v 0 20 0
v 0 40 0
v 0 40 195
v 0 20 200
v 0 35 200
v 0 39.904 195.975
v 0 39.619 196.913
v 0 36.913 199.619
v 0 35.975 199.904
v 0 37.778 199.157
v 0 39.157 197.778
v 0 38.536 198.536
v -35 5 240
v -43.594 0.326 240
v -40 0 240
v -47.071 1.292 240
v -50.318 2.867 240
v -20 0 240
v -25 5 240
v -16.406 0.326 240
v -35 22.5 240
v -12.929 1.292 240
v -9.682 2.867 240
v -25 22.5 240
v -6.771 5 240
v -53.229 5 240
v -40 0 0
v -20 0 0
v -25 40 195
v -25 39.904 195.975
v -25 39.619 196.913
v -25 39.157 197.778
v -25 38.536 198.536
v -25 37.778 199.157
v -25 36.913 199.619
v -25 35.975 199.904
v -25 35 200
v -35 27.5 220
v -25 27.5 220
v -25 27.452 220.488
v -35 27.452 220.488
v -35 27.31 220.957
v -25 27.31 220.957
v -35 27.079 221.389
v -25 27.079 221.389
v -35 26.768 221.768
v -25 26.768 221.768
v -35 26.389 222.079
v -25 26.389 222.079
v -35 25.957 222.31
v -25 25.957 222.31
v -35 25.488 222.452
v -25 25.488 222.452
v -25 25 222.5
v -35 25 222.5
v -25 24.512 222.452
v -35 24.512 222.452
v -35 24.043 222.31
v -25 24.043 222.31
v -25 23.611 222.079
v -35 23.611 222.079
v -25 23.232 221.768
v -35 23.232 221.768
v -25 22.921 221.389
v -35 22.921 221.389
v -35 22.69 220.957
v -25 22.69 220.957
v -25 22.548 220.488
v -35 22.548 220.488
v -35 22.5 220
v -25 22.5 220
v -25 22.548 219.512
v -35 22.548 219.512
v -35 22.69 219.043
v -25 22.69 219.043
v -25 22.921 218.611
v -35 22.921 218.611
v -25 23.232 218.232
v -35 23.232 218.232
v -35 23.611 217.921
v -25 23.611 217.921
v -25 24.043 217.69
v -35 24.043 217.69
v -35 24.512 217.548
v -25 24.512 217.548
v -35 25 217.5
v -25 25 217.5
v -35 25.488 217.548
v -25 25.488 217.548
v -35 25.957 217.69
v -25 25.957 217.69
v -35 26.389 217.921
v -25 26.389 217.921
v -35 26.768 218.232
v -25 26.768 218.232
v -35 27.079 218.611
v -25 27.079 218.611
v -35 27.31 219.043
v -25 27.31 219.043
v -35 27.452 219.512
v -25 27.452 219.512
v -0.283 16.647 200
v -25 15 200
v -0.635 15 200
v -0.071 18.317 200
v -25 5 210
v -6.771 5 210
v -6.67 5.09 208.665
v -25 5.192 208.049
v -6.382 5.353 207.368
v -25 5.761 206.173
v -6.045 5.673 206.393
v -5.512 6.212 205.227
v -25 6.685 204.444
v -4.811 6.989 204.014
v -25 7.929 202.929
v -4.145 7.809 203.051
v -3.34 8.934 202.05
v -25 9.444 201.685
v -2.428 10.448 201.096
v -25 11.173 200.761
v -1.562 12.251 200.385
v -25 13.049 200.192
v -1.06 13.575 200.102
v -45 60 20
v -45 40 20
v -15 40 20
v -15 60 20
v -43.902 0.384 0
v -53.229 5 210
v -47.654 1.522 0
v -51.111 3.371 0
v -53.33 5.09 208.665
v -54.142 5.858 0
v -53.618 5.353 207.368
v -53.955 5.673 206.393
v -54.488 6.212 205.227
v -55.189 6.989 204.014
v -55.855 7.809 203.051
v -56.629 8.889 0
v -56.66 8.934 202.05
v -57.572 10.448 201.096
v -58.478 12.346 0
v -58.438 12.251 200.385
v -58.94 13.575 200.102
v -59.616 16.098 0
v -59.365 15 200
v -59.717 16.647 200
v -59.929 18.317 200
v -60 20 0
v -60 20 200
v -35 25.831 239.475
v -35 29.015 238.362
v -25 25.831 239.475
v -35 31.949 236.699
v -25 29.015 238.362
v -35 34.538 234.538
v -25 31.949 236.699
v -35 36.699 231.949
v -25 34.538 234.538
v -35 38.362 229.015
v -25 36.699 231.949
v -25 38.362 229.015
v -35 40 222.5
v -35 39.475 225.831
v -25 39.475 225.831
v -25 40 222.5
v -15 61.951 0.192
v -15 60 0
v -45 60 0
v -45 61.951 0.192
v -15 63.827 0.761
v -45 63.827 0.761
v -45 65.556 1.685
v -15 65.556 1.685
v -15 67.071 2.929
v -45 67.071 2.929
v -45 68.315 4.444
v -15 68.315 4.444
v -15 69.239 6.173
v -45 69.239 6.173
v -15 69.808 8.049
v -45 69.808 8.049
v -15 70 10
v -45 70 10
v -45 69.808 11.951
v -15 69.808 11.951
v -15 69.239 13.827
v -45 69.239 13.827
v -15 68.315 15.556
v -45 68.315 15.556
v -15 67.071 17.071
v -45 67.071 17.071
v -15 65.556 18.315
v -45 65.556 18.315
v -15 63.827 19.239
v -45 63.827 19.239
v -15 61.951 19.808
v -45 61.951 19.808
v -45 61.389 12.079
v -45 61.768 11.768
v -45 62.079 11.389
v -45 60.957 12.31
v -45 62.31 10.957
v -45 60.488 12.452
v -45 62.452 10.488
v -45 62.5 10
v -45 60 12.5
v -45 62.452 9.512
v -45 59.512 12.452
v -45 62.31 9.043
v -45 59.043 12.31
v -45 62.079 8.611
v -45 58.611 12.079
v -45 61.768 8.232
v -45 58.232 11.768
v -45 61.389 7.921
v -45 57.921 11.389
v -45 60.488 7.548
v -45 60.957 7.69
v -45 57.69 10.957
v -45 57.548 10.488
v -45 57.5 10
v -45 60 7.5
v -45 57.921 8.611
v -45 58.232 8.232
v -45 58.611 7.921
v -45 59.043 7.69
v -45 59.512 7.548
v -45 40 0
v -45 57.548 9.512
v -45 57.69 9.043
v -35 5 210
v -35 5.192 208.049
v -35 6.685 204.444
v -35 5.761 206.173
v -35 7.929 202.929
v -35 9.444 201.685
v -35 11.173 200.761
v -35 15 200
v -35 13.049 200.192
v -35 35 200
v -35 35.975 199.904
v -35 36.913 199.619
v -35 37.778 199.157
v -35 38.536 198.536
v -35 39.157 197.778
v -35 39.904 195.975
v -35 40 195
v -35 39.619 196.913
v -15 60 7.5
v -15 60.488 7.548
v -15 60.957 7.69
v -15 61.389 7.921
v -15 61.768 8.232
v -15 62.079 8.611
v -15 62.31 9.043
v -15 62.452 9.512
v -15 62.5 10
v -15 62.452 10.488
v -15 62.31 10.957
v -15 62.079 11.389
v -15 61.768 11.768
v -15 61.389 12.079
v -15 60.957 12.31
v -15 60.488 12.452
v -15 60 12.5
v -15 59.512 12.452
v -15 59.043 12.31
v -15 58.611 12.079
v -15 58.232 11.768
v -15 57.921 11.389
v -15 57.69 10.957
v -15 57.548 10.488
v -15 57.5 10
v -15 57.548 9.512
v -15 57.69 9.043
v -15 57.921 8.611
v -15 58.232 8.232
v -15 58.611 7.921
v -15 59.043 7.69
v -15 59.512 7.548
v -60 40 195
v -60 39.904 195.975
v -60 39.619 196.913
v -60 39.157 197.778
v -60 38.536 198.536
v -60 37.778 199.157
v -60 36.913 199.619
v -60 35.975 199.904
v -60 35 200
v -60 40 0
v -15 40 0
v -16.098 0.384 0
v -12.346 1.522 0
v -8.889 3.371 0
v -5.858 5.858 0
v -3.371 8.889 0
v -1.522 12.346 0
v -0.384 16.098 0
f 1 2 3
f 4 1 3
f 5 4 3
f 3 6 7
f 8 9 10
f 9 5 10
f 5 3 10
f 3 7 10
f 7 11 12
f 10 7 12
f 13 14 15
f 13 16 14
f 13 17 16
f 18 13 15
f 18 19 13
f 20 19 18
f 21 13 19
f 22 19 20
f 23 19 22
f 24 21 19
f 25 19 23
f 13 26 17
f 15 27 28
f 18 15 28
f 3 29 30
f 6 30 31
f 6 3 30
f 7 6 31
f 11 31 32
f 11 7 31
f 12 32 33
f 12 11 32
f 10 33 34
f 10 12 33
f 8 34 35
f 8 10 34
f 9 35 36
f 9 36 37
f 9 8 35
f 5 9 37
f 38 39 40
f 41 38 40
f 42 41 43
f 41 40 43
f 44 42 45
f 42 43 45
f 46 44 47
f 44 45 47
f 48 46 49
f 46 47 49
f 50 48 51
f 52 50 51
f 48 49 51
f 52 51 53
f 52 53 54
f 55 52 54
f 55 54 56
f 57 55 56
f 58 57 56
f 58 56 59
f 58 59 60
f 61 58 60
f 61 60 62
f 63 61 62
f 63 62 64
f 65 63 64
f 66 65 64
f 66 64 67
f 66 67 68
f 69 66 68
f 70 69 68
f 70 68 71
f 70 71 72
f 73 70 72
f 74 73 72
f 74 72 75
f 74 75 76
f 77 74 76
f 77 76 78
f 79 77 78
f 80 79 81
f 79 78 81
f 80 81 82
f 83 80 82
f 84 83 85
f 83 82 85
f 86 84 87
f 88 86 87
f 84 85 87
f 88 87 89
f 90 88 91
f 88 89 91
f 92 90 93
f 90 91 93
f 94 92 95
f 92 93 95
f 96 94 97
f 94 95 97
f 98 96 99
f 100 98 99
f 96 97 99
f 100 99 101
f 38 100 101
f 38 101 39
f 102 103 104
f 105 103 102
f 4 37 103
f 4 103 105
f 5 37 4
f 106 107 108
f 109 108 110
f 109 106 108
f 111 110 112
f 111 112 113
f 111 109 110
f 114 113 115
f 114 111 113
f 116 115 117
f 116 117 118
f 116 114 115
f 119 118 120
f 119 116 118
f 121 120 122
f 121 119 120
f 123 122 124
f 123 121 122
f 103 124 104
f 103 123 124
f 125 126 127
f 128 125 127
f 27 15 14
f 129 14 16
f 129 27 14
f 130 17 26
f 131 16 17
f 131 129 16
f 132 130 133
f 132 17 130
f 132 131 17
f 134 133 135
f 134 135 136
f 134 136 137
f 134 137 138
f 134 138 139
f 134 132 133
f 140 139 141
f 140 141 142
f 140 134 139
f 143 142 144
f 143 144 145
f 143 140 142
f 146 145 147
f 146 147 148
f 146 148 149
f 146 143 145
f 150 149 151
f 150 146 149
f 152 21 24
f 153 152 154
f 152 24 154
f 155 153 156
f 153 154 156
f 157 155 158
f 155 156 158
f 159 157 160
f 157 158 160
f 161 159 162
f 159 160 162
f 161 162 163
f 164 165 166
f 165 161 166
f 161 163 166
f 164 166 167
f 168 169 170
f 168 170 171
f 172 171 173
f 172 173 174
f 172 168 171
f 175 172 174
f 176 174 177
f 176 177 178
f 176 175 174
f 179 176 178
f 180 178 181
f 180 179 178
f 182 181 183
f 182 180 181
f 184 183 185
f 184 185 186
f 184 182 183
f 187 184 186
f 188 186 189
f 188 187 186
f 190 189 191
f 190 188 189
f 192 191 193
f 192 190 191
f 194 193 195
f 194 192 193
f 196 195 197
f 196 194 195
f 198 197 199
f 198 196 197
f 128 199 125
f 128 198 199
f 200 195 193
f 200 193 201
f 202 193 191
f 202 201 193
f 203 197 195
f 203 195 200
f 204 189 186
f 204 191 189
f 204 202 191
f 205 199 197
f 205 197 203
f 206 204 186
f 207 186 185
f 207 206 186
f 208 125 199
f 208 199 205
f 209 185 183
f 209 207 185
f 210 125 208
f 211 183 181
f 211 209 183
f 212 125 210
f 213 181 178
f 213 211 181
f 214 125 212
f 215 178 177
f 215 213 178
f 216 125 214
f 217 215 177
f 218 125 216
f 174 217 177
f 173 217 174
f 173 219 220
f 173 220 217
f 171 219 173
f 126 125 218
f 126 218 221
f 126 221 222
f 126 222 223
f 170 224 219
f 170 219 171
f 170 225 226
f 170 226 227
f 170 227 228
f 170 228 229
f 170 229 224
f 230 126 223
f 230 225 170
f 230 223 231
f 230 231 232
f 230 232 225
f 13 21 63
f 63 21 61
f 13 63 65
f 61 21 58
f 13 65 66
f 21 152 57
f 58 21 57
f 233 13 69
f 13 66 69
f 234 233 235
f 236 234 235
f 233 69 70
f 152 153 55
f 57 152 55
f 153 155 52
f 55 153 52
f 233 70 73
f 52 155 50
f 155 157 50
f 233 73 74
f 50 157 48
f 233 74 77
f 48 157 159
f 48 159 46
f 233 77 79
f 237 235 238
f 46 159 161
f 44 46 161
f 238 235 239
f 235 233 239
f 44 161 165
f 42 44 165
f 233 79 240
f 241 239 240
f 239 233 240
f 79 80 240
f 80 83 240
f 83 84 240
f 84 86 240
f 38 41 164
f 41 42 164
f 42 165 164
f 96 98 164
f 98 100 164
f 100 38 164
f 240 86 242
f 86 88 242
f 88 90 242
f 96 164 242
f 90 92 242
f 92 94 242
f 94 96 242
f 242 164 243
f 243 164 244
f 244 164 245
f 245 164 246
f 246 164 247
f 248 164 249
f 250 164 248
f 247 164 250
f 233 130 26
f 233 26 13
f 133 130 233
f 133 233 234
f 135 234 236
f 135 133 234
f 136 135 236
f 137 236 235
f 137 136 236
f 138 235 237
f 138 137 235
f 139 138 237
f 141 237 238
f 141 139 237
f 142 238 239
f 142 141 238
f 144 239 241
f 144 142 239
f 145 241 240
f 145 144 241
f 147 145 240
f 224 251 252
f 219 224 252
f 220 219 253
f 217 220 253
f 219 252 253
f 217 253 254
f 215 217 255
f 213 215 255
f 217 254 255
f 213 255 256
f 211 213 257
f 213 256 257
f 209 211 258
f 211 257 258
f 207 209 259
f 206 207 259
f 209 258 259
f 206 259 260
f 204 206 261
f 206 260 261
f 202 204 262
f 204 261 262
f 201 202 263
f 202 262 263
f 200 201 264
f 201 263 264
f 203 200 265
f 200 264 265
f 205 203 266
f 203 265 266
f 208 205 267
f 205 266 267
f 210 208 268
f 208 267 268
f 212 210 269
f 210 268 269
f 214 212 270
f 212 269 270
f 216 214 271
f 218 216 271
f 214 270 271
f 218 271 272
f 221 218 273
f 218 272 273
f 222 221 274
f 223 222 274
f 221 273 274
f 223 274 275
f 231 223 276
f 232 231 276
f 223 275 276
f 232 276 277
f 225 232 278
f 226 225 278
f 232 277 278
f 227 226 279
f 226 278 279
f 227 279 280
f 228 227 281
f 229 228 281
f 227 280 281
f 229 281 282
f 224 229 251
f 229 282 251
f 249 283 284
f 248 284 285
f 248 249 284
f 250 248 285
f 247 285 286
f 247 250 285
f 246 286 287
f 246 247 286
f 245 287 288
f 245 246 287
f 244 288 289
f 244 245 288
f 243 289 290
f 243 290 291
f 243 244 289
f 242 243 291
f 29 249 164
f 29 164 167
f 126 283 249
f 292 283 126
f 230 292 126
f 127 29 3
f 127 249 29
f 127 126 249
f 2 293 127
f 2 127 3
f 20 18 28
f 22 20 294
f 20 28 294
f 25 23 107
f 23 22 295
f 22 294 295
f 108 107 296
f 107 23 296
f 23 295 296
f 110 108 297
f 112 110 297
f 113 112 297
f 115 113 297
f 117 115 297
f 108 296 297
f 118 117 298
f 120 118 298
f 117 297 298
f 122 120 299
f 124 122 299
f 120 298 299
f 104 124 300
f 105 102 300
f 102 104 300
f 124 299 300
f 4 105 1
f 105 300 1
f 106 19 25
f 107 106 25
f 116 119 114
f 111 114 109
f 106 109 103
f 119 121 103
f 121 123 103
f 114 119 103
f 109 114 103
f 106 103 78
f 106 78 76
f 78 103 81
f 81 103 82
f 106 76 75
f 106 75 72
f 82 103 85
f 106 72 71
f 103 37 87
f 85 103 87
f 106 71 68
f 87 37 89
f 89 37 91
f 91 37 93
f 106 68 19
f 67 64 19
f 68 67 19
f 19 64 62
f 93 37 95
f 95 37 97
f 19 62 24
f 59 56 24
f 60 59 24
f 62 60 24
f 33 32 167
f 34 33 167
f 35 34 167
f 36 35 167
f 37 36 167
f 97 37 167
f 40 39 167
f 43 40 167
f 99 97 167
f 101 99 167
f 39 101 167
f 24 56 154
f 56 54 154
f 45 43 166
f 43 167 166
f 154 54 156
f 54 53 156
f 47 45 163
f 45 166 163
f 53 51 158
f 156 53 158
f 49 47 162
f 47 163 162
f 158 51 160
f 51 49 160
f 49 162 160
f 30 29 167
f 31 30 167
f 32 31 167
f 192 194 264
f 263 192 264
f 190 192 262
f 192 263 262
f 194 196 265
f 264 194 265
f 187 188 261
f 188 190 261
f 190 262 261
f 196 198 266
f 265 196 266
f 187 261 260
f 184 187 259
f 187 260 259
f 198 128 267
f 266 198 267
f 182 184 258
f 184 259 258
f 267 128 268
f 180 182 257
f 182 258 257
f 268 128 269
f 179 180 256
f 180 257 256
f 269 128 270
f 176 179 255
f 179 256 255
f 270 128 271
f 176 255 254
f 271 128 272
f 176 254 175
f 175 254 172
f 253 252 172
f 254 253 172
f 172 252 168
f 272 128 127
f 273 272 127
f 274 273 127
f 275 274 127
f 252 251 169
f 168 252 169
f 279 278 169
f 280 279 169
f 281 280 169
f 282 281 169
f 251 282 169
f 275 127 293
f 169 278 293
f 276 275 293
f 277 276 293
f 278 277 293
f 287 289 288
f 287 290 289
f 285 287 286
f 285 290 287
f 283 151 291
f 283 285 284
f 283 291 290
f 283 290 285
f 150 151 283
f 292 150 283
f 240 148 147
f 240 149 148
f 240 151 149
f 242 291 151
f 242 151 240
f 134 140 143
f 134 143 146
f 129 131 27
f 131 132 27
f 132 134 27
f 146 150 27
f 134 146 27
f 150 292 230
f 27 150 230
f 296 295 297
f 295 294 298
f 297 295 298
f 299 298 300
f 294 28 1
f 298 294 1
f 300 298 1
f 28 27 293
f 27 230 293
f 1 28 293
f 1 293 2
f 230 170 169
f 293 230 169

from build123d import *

# Parameters (mm, degrees)
SKETCH1_W           = 60
SKETCH1_H           = 40
BOSS_EXTRUDE1_DEPTH = 240
SKETCH2_W           = 25
SKETCH2_H           = 40
CUT_EXTRUDE1_DEPTH  = 35
BOSS_EXTRUDE7_DEPTH = 25
BOSS_EXTRUDE5_START = 25
BOSS_EXTRUDE5_DEPTH = 25
SKETCH3_W           = 30
SKETCH3_H           = 20
BOSS_EXTRUDE2_DEPTH = 35
SKETCH5_R           = 2.5
CUT_EXTRUDE3_DEPTH  = 30
CUT_EXTRUDE4_DEPTH  = 240
CUT_EXTRUDE5_DEPTH  = 20
CUT_EXTRUDE6_DEPTH  = 25
CUT_EXTRUDE7_START  = -25
CUT_EXTRUDE7_DEPTH  = 25
SKETCH19_R          = 2.5
CUT_EXTRUDE8_DEPTH  = 30
CUT_EXTRUDE9_DEPTH  = 30


with BuildPart() as part:
    # Sketch1 → Boss-Extrude1 (new body)
    with BuildSketch(Plane.XY):
        with Locations((-30, 20)):
            Rectangle(SKETCH1_W, SKETCH1_H)
    extrude(amount=BOSS_EXTRUDE1_DEPTH)

    # Sketch2 → Cut-Extrude1 (cut)
    with BuildSketch(Plane(origin=(0, 40, 0), x_dir=(1, 0, 0), z_dir=(0, 1, 0))):
        with Locations((-47.5, -220)):
            Rectangle(SKETCH2_W, SKETCH2_H)
        with Locations((-12.5, -220)):
            Rectangle(SKETCH2_W, SKETCH2_H)
    extrude(amount=-CUT_EXTRUDE1_DEPTH, mode=Mode.SUBTRACT)

    # Sketch18 → Boss-Extrude7 (add)
    with BuildSketch(Plane(origin=(-25, 0, 0), x_dir=(0, 0, -1), z_dir=(1, 0, 0))):
        with BuildLine():
            Line((-200, 5), (-210, 5))
            ThreePointArc((-210, 5), (-202.928932188, 7.928932188), (-200, 15))
            Line((-200, 15), (-200, 5))
        make_face()
    extrude(amount=BOSS_EXTRUDE7_DEPTH)

    # Sketch16 → Boss-Extrude5 (add)
    with BuildSketch(Plane.ZY.offset(35).offset(BOSS_EXTRUDE5_START)):
        with BuildLine():
            Line((200, 15), (160, 5))
            Line((160, 5), (210, 5))
            ThreePointArc((210, 5), (202.928932188, 7.928932188), (200, 15))
        make_face()
    extrude(amount=-BOSS_EXTRUDE5_DEPTH)

    # Sketch3 → Boss-Extrude2 (add)
    with BuildSketch(Plane(origin=(0, 40, 0), x_dir=(1, 0, 0), z_dir=(0, 1, 0))):
        with Locations((-30, -10)):
            Rectangle(SKETCH3_W, SKETCH3_H)
    extrude(amount=BOSS_EXTRUDE2_DEPTH)

    # Sketch5 → Cut-Extrude3 (cut)
    with BuildSketch(Plane(origin=(-25, 0, 0), x_dir=(0, 0, -1), z_dir=(1, 0, 0))):
        with Locations((-220, 25)):
            Circle(SKETCH5_R)
    extrude(amount=-CUT_EXTRUDE3_DEPTH, mode=Mode.SUBTRACT)

    # Sketch6 → Cut-Extrude4 (cut)
    with BuildSketch(Plane(origin=(0, 0, 0), x_dir=(-1, 0, 0), z_dir=(0, 0, -1))):
        with BuildLine():
            Line((60, 20), (60, 0))
            Line((60, 0), (40, 0))
            ThreePointArc((40, 0), (54.142135624, 5.857864376), (60, 20))
        make_face()
        with BuildLine():
            Line((0, 20), (0, 0))
            Line((0, 0), (20, 0))
            ThreePointArc((20, 0), (5.857864376, 5.857864376), (0, 20))
        make_face()
    extrude(amount=-CUT_EXTRUDE4_DEPTH, mode=Mode.SUBTRACT)

    # Sketch8 → Cut-Extrude5 (cut)
    with BuildSketch(Plane(origin=(-25, 0, 0), x_dir=(0, 0, -1), z_dir=(1, 0, 0))):
        with BuildLine():
            Line((-240, 40), (-240, 22.5))
            ThreePointArc((-240, 22.5), (-234.537682266, 34.537682266), (-222.5, 40))
            Line((-222.5, 40), (-240, 40))
        make_face()
    extrude(amount=-CUT_EXTRUDE5_DEPTH, mode=Mode.SUBTRACT)

    # Sketch10 → Cut-Extrude6 (cut)
    with BuildSketch(Plane(origin=(0, 0, 0), x_dir=(0, 0, -1), z_dir=(1, 0, 0))):
        with BuildLine():
            Line((-200, 40), (-195, 40))
            ThreePointArc((-195, 40), (-198.535533906, 38.535533906), (-200, 35))
            Line((-200, 35), (-200, 40))
        make_face()
    extrude(amount=-CUT_EXTRUDE6_DEPTH, mode=Mode.SUBTRACT)

    # Sketch11 → Cut-Extrude7 (cut)
    with BuildSketch(Plane.ZY.offset(60).offset(CUT_EXTRUDE7_START)):
        with BuildLine():
            Line((200, 40), (195, 40))
            ThreePointArc((195, 40), (198.535533906, 38.535533906), (200, 35))
            Line((200, 35), (200, 40))
        make_face()
    extrude(amount=CUT_EXTRUDE7_DEPTH, mode=Mode.SUBTRACT)

    # Sketch19 → Cut-Extrude8 (cut)
    with BuildSketch(Plane(origin=(-15, 0, 0), x_dir=(0, 0, -1), z_dir=(1, 0, 0))):
        with Locations((-10, 60)):
            Circle(SKETCH19_R)
    extrude(amount=-CUT_EXTRUDE8_DEPTH, mode=Mode.SUBTRACT)

    # Sketch20 → Cut-Extrude9 (cut)
    with BuildSketch(Plane(origin=(-15, 0, 0), x_dir=(0, 0, -1), z_dir=(1, 0, 0))):
        with BuildLine():
            Line((-20, 75), (0, 75))
            Line((0, 75), (0, 60))
            ThreePointArc((0, 60), (-10, 70), (-20, 60))
            Line((-20, 60), (-20, 75))
        make_face()
    extrude(amount=-CUT_EXTRUDE9_DEPTH, mode=Mode.SUBTRACT)


solid = part.part
